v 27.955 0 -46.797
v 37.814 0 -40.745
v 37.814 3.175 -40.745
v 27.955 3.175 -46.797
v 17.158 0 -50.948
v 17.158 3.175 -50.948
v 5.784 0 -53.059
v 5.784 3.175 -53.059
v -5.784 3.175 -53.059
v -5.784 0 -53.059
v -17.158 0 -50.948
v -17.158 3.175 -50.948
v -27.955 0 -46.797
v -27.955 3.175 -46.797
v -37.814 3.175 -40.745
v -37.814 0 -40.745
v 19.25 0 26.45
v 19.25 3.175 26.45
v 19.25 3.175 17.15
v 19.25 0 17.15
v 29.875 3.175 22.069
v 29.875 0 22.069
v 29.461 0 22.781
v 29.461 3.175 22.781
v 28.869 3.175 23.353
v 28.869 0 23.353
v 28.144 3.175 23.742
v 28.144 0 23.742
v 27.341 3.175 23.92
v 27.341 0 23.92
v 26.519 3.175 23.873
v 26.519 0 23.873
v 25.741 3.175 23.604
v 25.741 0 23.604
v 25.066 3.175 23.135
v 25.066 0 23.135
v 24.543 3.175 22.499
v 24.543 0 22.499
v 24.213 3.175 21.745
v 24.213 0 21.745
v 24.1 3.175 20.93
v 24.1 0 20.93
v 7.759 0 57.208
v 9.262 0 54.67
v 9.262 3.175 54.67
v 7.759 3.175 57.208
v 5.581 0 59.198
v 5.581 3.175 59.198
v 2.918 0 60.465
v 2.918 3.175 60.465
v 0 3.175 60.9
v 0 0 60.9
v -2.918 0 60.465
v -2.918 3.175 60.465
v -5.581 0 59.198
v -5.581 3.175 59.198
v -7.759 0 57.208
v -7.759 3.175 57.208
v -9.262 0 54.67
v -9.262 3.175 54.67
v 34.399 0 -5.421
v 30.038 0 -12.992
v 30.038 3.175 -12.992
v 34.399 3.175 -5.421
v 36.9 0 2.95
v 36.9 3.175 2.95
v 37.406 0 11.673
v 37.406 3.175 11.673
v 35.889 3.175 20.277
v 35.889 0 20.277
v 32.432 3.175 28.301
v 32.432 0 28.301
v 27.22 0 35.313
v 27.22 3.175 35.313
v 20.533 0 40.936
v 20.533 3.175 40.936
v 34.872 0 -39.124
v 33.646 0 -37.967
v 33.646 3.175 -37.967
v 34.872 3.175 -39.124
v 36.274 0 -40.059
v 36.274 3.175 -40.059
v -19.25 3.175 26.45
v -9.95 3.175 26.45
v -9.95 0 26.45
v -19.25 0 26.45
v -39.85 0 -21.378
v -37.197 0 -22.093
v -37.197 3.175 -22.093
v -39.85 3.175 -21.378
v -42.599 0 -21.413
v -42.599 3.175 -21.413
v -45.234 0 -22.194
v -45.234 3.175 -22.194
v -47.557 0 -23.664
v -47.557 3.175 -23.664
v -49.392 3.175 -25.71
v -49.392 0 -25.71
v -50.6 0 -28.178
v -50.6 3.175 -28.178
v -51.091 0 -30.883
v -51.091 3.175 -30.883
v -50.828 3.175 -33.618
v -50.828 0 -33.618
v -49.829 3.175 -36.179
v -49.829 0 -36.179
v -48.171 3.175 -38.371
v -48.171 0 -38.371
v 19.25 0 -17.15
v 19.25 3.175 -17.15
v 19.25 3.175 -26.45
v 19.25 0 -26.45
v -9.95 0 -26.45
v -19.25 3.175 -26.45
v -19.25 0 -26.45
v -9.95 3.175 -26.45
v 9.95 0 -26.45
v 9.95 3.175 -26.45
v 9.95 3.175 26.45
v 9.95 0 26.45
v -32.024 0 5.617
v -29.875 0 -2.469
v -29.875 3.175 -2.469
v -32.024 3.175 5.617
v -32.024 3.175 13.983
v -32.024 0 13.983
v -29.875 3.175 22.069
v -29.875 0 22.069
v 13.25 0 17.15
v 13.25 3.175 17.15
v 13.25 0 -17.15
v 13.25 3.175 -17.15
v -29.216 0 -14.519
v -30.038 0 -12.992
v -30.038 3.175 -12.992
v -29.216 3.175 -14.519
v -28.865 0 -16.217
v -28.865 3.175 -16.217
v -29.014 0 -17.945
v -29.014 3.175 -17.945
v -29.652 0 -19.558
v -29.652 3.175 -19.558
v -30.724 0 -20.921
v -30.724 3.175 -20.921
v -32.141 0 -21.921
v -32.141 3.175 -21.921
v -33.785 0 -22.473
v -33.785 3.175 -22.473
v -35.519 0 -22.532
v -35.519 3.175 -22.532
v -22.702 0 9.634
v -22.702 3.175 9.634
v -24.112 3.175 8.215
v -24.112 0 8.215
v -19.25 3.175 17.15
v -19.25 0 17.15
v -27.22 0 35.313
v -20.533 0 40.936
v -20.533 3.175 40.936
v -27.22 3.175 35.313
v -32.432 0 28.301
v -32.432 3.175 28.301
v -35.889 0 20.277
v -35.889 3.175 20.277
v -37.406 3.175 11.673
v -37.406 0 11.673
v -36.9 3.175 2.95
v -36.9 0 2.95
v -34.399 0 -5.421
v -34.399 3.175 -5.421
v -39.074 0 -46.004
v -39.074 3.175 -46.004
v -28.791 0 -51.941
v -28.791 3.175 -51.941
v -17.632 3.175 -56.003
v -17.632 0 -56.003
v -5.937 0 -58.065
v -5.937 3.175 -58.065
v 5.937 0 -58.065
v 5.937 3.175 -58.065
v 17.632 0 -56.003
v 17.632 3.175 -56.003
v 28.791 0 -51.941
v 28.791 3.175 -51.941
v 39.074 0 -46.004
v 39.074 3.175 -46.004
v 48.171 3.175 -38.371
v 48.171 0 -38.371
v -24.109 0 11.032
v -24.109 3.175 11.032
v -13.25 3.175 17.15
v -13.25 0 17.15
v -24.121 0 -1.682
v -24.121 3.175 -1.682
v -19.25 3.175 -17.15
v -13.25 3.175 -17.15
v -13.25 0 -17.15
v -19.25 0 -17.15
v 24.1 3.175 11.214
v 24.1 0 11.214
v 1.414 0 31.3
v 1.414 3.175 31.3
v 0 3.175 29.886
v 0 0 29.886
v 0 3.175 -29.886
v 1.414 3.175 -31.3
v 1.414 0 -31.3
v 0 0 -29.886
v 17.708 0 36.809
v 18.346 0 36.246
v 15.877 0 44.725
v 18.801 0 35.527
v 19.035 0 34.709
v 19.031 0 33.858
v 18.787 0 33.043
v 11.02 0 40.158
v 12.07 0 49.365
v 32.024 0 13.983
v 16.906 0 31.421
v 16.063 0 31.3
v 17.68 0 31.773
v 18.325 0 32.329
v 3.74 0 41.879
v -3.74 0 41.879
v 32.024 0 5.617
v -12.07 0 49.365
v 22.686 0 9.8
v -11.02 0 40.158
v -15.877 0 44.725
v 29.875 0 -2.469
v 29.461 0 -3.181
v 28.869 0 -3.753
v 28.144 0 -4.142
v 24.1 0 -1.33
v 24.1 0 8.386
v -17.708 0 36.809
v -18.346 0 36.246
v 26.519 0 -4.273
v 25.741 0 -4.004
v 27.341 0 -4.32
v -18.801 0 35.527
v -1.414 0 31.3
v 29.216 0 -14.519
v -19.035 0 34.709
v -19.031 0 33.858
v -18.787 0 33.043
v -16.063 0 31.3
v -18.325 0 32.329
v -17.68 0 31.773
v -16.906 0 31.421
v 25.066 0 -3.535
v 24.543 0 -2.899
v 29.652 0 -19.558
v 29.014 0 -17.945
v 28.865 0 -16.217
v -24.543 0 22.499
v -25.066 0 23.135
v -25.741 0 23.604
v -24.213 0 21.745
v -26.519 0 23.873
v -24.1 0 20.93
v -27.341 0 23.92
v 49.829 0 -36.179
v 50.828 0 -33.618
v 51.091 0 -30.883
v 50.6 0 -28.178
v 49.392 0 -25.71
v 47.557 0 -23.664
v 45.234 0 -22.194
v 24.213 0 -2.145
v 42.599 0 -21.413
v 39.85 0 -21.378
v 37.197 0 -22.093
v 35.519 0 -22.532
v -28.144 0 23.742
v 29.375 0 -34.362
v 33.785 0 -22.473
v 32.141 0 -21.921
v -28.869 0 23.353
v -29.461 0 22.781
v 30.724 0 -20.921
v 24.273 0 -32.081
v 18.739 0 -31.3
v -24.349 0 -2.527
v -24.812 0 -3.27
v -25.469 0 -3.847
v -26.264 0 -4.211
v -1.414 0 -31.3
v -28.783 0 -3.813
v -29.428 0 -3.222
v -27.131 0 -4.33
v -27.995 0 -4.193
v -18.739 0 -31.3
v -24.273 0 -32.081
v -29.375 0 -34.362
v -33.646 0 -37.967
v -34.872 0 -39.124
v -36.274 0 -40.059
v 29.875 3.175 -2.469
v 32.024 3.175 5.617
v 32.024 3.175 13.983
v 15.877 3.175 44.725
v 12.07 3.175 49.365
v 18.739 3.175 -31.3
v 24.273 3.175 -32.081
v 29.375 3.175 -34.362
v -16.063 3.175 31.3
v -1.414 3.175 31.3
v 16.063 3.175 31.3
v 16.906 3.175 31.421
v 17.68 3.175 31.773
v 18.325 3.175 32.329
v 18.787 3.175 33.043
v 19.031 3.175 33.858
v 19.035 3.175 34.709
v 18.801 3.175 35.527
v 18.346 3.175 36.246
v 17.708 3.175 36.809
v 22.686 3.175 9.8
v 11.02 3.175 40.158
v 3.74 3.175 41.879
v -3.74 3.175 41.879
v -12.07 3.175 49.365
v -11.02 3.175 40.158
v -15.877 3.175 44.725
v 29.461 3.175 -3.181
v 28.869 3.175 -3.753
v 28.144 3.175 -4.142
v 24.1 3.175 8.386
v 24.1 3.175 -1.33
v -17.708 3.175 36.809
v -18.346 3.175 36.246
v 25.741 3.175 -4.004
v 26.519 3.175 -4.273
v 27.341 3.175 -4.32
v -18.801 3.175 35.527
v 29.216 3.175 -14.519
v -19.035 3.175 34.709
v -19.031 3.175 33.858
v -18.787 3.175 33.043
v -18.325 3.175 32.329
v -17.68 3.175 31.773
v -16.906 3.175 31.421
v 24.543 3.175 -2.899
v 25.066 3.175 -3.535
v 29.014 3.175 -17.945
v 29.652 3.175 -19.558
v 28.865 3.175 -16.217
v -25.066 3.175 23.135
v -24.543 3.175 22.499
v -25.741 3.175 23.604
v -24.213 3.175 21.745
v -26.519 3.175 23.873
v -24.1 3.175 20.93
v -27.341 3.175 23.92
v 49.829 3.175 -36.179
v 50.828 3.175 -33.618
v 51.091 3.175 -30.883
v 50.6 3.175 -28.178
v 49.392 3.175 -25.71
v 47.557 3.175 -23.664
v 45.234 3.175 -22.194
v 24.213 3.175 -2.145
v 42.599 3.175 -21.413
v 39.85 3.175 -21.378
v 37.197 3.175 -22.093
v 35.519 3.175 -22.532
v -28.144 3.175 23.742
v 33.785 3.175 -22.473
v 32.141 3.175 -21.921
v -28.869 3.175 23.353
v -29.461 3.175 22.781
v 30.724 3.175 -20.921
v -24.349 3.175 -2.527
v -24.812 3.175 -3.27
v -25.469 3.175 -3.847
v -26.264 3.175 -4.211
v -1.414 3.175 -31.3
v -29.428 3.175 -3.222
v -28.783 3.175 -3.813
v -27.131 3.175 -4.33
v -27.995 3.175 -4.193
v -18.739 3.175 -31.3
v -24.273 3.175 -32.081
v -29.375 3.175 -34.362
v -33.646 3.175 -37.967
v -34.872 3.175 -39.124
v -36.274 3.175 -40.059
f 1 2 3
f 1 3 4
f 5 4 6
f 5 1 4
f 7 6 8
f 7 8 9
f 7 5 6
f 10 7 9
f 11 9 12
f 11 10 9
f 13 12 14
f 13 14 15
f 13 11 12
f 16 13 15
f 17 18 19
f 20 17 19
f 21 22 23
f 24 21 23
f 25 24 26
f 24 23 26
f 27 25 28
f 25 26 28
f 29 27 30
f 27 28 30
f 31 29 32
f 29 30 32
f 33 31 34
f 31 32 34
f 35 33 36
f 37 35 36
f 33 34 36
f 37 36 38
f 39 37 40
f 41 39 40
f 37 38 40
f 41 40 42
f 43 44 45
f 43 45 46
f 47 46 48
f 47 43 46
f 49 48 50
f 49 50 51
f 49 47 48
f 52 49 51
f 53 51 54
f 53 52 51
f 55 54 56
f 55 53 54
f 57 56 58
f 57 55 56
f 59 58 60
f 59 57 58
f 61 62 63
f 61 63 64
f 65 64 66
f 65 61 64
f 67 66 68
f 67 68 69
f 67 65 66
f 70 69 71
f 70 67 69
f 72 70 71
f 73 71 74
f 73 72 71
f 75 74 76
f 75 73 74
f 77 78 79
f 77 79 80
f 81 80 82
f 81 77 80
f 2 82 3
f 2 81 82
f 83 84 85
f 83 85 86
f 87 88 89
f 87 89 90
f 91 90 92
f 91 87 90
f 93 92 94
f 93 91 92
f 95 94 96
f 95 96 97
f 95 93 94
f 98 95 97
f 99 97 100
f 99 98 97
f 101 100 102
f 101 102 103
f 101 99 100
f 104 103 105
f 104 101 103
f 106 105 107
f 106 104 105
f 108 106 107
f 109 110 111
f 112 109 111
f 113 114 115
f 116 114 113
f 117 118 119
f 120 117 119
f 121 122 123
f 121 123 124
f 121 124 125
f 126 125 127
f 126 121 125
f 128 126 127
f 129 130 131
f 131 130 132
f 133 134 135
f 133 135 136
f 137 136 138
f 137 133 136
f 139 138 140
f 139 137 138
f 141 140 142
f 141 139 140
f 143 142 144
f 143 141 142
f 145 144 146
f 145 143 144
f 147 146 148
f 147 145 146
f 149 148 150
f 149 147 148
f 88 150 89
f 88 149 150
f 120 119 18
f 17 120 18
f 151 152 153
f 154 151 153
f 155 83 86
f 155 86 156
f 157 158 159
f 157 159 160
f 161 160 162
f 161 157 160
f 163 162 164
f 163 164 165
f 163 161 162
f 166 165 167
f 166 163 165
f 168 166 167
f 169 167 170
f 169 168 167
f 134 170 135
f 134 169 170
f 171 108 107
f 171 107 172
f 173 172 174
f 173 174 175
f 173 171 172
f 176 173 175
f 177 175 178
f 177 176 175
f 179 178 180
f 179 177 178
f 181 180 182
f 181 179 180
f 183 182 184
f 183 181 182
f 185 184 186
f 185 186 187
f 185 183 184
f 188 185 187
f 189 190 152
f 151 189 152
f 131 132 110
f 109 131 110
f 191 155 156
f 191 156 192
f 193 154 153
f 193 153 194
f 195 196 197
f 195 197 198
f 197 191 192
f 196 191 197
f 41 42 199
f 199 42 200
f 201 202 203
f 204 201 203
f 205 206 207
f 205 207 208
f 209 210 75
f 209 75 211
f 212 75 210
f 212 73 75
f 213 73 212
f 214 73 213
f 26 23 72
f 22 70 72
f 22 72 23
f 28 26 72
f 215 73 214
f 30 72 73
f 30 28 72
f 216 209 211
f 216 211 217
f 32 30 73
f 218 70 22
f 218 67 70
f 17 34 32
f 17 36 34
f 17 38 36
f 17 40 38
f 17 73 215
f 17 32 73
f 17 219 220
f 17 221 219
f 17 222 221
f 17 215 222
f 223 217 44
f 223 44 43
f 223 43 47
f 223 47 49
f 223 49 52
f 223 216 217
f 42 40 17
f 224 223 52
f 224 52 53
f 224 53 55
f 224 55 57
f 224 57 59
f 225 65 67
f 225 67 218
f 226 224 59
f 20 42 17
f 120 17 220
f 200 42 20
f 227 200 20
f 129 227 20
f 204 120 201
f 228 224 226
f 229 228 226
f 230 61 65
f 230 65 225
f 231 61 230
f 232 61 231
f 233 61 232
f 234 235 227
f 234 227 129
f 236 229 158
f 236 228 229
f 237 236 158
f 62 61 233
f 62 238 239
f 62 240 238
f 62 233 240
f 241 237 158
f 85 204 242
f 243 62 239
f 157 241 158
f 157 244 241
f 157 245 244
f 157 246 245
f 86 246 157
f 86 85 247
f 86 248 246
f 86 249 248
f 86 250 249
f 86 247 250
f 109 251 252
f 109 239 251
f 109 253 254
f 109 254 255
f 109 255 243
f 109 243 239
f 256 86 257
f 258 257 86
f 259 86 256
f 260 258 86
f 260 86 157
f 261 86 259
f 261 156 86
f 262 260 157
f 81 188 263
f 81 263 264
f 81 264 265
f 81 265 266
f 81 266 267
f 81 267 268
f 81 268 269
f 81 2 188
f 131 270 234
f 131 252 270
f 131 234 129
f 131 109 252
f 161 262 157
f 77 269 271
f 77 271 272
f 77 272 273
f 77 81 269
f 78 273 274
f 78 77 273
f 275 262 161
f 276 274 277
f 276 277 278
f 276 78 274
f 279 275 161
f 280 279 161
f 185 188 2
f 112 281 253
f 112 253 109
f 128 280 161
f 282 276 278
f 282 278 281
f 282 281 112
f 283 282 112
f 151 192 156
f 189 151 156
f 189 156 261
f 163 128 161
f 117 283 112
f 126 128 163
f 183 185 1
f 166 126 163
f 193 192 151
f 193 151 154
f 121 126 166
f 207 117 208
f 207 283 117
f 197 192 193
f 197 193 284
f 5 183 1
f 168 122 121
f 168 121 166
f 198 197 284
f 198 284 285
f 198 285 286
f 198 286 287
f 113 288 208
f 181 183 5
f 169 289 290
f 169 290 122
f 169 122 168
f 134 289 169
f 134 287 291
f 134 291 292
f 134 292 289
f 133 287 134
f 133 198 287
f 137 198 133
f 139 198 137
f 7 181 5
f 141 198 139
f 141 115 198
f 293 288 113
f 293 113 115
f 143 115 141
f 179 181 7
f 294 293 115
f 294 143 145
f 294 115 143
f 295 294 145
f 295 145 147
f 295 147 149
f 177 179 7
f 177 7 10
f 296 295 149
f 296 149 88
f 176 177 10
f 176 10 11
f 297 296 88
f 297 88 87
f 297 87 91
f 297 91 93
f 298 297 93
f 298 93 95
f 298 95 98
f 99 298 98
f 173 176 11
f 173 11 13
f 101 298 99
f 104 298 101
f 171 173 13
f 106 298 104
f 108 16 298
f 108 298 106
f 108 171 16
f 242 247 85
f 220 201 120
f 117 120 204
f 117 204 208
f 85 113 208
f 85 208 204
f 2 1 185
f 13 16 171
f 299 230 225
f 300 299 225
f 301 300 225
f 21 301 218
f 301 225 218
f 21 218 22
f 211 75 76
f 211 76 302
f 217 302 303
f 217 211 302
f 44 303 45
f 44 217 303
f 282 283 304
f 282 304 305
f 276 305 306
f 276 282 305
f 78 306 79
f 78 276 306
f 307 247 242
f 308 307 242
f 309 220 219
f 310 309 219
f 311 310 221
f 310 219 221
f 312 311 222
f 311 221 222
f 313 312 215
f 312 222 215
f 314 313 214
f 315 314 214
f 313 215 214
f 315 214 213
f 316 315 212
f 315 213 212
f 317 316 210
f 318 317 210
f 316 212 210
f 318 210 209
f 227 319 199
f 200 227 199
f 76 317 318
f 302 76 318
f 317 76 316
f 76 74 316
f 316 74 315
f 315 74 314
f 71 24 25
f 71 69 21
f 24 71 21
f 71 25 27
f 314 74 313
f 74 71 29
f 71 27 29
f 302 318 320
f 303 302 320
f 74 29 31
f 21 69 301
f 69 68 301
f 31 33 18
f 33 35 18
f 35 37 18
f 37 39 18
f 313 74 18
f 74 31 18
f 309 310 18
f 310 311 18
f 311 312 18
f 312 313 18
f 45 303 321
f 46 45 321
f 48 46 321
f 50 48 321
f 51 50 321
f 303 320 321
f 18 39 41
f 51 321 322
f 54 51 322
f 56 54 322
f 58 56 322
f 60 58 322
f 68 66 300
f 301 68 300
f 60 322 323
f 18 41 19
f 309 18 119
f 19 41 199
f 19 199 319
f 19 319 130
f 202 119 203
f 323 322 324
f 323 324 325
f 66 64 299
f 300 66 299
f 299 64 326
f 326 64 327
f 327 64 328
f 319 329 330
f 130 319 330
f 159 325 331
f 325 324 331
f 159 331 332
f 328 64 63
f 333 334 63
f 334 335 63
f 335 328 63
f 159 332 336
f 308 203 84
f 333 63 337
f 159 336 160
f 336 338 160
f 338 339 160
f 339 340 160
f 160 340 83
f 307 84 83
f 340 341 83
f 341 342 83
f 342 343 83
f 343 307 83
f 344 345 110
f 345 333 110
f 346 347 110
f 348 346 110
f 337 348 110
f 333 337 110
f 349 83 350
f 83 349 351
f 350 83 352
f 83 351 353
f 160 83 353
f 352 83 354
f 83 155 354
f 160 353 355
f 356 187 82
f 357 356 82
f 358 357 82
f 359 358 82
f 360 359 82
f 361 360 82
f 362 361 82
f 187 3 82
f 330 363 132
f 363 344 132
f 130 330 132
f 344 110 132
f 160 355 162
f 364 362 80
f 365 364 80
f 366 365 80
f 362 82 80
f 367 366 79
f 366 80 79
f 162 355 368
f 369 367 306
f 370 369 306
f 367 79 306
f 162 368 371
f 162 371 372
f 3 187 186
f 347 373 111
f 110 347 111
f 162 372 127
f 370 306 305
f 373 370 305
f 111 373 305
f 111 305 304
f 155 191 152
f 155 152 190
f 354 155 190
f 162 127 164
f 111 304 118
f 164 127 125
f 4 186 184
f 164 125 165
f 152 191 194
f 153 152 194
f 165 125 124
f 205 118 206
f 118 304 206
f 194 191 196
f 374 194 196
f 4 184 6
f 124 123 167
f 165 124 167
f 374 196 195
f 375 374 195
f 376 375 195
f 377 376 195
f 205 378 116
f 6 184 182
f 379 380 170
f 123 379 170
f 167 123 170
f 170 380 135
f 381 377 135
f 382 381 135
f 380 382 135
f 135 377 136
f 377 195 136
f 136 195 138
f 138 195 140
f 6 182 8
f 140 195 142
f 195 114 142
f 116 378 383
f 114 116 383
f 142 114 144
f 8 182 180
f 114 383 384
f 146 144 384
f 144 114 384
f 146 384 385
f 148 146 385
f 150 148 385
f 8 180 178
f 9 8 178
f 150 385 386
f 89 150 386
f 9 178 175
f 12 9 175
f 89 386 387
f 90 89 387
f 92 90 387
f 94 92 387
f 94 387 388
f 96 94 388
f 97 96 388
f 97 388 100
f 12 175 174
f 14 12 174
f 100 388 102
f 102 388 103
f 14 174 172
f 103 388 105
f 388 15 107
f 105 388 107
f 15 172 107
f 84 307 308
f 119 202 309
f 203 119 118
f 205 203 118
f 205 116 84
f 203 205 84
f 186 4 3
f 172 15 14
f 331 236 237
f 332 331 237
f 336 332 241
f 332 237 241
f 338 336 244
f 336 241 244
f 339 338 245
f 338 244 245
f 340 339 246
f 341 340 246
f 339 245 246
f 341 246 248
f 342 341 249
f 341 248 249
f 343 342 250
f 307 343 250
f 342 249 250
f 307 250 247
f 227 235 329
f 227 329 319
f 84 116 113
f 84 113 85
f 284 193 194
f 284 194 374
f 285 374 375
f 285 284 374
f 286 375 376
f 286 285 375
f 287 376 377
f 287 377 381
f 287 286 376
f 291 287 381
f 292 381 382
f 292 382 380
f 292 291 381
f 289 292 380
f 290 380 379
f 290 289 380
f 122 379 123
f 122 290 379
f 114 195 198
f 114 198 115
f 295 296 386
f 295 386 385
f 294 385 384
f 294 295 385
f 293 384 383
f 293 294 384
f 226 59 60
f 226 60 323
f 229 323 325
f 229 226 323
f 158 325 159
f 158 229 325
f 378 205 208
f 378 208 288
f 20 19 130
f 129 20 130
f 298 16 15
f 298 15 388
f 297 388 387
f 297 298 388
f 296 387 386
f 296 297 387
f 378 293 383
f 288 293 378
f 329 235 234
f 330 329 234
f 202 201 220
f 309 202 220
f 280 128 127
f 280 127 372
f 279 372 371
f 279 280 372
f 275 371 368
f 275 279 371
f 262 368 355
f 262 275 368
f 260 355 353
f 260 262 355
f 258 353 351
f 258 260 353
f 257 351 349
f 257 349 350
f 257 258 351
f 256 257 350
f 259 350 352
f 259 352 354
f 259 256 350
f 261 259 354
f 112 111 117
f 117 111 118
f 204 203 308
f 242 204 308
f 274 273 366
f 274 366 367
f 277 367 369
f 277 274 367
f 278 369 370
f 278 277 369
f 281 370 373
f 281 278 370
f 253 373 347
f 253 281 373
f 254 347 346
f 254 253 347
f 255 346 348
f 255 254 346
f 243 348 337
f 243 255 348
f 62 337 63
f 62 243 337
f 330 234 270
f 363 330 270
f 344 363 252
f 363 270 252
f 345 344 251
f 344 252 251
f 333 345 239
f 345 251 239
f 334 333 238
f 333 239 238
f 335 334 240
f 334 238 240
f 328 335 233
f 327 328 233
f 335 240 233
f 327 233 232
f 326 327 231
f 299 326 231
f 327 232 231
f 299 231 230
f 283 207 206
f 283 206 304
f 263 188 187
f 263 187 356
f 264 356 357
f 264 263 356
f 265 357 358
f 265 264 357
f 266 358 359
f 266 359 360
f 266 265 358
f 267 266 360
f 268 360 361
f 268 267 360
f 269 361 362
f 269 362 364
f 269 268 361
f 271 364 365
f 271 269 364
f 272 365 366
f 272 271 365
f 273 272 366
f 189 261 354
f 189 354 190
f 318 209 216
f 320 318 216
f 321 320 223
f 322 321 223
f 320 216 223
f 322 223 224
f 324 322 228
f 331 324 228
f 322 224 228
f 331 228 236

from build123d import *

# Parameters (mm, degrees)
BOSS_EXTRUDE1_DEPTH = 3.175
CUT_EXTRUDE3_REACH  = 81.562
CUT_EXTRUDE4_REACH  = 81.562


with BuildPart() as part:
    # Sketch1 → Boss-Extrude1 (new body)
    with BuildSketch(Plane(origin=(0, 0, 0), x_dir=(1, 0, 0), z_dir=(0, 1, 0))):
        with BuildLine():
            ThreePointArc((-48.171067812, 38.371067812), (0, 58.324177414), (48.171067812, 38.371067812))
            ThreePointArc((48.171067812, 38.371067812), (49.391561976, 25.709830056), (37.196595128, 22.093294269))
            ThreePointArc((37.196595128, 22.093294269), (30.138485199, 20.278544613), (30.037914527, 12.991561861))
            ThreePointArc((30.037914527, 12.991561861), (36.897831444, -16.018932904), (20.532641942, -40.935751303))
            ThreePointArc((20.532641942, -40.935751303), (13.857325378, -46.949439456), (9.262101932, -54.670075305))
            ThreePointArc((9.262101932, -54.670075305), (0, -60.9), (-9.262101932, -54.670075305))
            ThreePointArc((-9.262101932, -54.670075305), (-13.857325378, -46.949439456), (-20.532641942, -40.935751303))
            ThreePointArc((-20.532641942, -40.935751303), (-36.897831444, -16.018932904), (-30.037914527, 12.991561861))
            ThreePointArc((-30.037914527, 12.991561861), (-30.138485199, 20.278544613), (-37.196595128, 22.093294269))
            ThreePointArc((-37.196595128, 22.093294269), (-49.391561976, 25.709830056), (-48.171067812, 38.371067812))
        make_face()
        with BuildLine():
            Line((-18.739320225, 31.3), (18.739320225, 31.3))
            ThreePointArc((18.739320225, 31.3), (26.904286034, 33.042581416), (33.646440075, 37.966666667))
            ThreePointArc((33.646440075, 37.966666667), (35.5534685, 39.620816565), (37.813975674, 40.744683379))
            ThreePointArc((37.813975674, 40.744683379), (0, 53.324177414), (-37.813975674, 40.744683379))
            ThreePointArc((-37.813975674, 40.744683379), (-35.5534685, 39.620816565), (-33.646440075, 37.966666667))
            ThreePointArc((-33.646440075, 37.966666667), (-26.904286034, 33.042581416), (-18.739320225, 31.3))
        make_face(mode=Mode.SUBTRACT)
        with BuildLine():
            Line((-24.1, -20.929751273), (-24.120801343, 1.682420185))
            ThreePointArc((-24.120801343, 1.682420185), (-26.693463619, 4.302078337), (-29.875081258, 2.469454748))
            ThreePointArc((-29.875081258, 2.469454748), (-32.296439432, -9.8), (-29.875081258, -22.069454748))
            ThreePointArc((-29.875081258, -22.069454748), (-26.519157411, -23.87298451), (-24.1, -20.929751273))
        make_face(mode=Mode.SUBTRACT)
        with BuildLine():
            Line((24.1, -20.929751273), (24.1, 1.329751273))
            ThreePointArc((24.1, 1.329751273), (26.519157411, 4.27298451), (29.875081258, 2.469454748))
            ThreePointArc((29.875081258, 2.469454748), (32.296439432, -9.8), (29.875081258, -22.069454748))
            ThreePointArc((29.875081258, -22.069454748), (26.519157411, -23.87298451), (24.1, -20.929751273))
        make_face(mode=Mode.SUBTRACT)
        with BuildLine():
            Line((-16.063354675, -31.3), (16.063354675, -31.3))
            ThreePointArc((16.063354675, -31.3), (18.937942636, -33.441662042), (17.708266649, -36.8088373))
            ThreePointArc((17.708266649, -36.8088373), (0, -42.096439432), (-17.708266649, -36.8088373))
            ThreePointArc((-17.708266649, -36.8088373), (-18.937942636, -33.441662042), (-16.063354675, -31.3))
        make_face(mode=Mode.SUBTRACT)
    extrude(amount=BOSS_EXTRUDE1_DEPTH)

    # Sketch2 → Cut-Extrude3 (cut, up to next)
    with BuildSketch(Plane(origin=(0, 3.175, 0), x_dir=(1, 0, 0), z_dir=(0, 1, 0)), mode=Mode.PRIVATE) as cut_extrude3_sk1:
        Polygon((-19.25, -17.15), (-13.25, -17.15), (-13.25, 17.15), (-19.25, 17.15), (-19.25, 26.45), (-9.95, 26.45), (-9.95, -26.45), (-19.25, -26.45), align=None)
    cut_extrude3_tool1 = extrude(cut_extrude3_sk1.sketch, amount=-CUT_EXTRUDE3_REACH, mode=Mode.PRIVATE) & part.part
    # Sketch2 → Cut-Extrude3 (cut, up to next)
    with BuildSketch(Plane(origin=(0, 3.175, 0), x_dir=(1, 0, 0), z_dir=(0, 1, 0)), mode=Mode.PRIVATE) as cut_extrude3_sk2:
        Polygon((19.25, -17.15), (13.25, -17.15), (13.25, 17.15), (19.25, 17.15), (19.25, 26.45), (9.95, 26.45), (9.95, -26.45), (19.25, -26.45), align=None)
    cut_extrude3_tool2 = extrude(cut_extrude3_sk2.sketch, amount=-CUT_EXTRUDE3_REACH, mode=Mode.PRIVATE) & part.part
    add(cut_extrude3_tool1.solids().sort_by_distance((-16.25, 3.175, 17.687113))[0], mode=Mode.SUBTRACT)
    add(cut_extrude3_tool2.solids().sort_by_distance((16.25, 3.175, 17.687113))[0], mode=Mode.SUBTRACT)

    # Sketch8 → Cut-Extrude4 (cut, up to next)
    with BuildSketch(Plane(origin=(0, 3.175, 0), x_dir=(1, 0, 0), z_dir=(0, 1, 0)), mode=Mode.PRIVATE) as cut_extrude4_sk1:
        Polygon((-22.702010907, -9.63396598), (-24.111696309, -8.21523871), (-24.109105034, -11.032092379), align=None)
    cut_extrude4_tool1 = extrude(cut_extrude4_sk1.sketch, amount=-CUT_EXTRUDE4_REACH, mode=Mode.PRIVATE) & part.part
    # Sketch8 → Cut-Extrude4 (cut, up to next)
    with BuildSketch(Plane(origin=(0, 3.175, 0), x_dir=(1, 0, 0), z_dir=(0, 1, 0)), mode=Mode.PRIVATE) as cut_extrude4_sk2:
        Polygon((22.685786438, -9.8), (24.1, -11.214213562), (24.1, -8.385786438), align=None)
    cut_extrude4_tool2 = extrude(cut_extrude4_sk2.sketch, amount=-CUT_EXTRUDE4_REACH, mode=Mode.PRIVATE) & part.part
    # Sketch8 → Cut-Extrude4 (cut, up to next)
    with BuildSketch(Plane(origin=(0, 3.175, 0), x_dir=(1, 0, 0), z_dir=(0, 1, 0)), mode=Mode.PRIVATE) as cut_extrude4_sk3:
        Polygon((0, -29.885786438), (-1.414213562, -31.3), (1.414213562, -31.3), align=None)
    cut_extrude4_tool3 = extrude(cut_extrude4_sk3.sketch, amount=-CUT_EXTRUDE4_REACH, mode=Mode.PRIVATE) & part.part
    # Sketch8 → Cut-Extrude4 (cut, up to next)
    with BuildSketch(Plane(origin=(0, 3.175, 0), x_dir=(1, 0, 0), z_dir=(0, 1, 0)), mode=Mode.PRIVATE) as cut_extrude4_sk4:
        Polygon((0, 29.885786438), (-1.414213562, 31.3), (1.414213562, 31.3), align=None)
    cut_extrude4_tool4 = extrude(cut_extrude4_sk4.sketch, amount=-CUT_EXTRUDE4_REACH, mode=Mode.PRIVATE) & part.part
    add(cut_extrude4_tool1.solids().sort_by_distance((-23.640937, 3.175, 9.627099))[0], mode=Mode.SUBTRACT)
    add(cut_extrude4_tool2.solids().sort_by_distance((23.628595, 3.175, 9.8))[0], mode=Mode.SUBTRACT)
    add(cut_extrude4_tool3.solids().sort_by_distance((0, 3.175, 30.828595))[0], mode=Mode.SUBTRACT)
    add(cut_extrude4_tool4.solids().sort_by_distance((0, 3.175, -30.828595))[0], mode=Mode.SUBTRACT)


solid = part.part
